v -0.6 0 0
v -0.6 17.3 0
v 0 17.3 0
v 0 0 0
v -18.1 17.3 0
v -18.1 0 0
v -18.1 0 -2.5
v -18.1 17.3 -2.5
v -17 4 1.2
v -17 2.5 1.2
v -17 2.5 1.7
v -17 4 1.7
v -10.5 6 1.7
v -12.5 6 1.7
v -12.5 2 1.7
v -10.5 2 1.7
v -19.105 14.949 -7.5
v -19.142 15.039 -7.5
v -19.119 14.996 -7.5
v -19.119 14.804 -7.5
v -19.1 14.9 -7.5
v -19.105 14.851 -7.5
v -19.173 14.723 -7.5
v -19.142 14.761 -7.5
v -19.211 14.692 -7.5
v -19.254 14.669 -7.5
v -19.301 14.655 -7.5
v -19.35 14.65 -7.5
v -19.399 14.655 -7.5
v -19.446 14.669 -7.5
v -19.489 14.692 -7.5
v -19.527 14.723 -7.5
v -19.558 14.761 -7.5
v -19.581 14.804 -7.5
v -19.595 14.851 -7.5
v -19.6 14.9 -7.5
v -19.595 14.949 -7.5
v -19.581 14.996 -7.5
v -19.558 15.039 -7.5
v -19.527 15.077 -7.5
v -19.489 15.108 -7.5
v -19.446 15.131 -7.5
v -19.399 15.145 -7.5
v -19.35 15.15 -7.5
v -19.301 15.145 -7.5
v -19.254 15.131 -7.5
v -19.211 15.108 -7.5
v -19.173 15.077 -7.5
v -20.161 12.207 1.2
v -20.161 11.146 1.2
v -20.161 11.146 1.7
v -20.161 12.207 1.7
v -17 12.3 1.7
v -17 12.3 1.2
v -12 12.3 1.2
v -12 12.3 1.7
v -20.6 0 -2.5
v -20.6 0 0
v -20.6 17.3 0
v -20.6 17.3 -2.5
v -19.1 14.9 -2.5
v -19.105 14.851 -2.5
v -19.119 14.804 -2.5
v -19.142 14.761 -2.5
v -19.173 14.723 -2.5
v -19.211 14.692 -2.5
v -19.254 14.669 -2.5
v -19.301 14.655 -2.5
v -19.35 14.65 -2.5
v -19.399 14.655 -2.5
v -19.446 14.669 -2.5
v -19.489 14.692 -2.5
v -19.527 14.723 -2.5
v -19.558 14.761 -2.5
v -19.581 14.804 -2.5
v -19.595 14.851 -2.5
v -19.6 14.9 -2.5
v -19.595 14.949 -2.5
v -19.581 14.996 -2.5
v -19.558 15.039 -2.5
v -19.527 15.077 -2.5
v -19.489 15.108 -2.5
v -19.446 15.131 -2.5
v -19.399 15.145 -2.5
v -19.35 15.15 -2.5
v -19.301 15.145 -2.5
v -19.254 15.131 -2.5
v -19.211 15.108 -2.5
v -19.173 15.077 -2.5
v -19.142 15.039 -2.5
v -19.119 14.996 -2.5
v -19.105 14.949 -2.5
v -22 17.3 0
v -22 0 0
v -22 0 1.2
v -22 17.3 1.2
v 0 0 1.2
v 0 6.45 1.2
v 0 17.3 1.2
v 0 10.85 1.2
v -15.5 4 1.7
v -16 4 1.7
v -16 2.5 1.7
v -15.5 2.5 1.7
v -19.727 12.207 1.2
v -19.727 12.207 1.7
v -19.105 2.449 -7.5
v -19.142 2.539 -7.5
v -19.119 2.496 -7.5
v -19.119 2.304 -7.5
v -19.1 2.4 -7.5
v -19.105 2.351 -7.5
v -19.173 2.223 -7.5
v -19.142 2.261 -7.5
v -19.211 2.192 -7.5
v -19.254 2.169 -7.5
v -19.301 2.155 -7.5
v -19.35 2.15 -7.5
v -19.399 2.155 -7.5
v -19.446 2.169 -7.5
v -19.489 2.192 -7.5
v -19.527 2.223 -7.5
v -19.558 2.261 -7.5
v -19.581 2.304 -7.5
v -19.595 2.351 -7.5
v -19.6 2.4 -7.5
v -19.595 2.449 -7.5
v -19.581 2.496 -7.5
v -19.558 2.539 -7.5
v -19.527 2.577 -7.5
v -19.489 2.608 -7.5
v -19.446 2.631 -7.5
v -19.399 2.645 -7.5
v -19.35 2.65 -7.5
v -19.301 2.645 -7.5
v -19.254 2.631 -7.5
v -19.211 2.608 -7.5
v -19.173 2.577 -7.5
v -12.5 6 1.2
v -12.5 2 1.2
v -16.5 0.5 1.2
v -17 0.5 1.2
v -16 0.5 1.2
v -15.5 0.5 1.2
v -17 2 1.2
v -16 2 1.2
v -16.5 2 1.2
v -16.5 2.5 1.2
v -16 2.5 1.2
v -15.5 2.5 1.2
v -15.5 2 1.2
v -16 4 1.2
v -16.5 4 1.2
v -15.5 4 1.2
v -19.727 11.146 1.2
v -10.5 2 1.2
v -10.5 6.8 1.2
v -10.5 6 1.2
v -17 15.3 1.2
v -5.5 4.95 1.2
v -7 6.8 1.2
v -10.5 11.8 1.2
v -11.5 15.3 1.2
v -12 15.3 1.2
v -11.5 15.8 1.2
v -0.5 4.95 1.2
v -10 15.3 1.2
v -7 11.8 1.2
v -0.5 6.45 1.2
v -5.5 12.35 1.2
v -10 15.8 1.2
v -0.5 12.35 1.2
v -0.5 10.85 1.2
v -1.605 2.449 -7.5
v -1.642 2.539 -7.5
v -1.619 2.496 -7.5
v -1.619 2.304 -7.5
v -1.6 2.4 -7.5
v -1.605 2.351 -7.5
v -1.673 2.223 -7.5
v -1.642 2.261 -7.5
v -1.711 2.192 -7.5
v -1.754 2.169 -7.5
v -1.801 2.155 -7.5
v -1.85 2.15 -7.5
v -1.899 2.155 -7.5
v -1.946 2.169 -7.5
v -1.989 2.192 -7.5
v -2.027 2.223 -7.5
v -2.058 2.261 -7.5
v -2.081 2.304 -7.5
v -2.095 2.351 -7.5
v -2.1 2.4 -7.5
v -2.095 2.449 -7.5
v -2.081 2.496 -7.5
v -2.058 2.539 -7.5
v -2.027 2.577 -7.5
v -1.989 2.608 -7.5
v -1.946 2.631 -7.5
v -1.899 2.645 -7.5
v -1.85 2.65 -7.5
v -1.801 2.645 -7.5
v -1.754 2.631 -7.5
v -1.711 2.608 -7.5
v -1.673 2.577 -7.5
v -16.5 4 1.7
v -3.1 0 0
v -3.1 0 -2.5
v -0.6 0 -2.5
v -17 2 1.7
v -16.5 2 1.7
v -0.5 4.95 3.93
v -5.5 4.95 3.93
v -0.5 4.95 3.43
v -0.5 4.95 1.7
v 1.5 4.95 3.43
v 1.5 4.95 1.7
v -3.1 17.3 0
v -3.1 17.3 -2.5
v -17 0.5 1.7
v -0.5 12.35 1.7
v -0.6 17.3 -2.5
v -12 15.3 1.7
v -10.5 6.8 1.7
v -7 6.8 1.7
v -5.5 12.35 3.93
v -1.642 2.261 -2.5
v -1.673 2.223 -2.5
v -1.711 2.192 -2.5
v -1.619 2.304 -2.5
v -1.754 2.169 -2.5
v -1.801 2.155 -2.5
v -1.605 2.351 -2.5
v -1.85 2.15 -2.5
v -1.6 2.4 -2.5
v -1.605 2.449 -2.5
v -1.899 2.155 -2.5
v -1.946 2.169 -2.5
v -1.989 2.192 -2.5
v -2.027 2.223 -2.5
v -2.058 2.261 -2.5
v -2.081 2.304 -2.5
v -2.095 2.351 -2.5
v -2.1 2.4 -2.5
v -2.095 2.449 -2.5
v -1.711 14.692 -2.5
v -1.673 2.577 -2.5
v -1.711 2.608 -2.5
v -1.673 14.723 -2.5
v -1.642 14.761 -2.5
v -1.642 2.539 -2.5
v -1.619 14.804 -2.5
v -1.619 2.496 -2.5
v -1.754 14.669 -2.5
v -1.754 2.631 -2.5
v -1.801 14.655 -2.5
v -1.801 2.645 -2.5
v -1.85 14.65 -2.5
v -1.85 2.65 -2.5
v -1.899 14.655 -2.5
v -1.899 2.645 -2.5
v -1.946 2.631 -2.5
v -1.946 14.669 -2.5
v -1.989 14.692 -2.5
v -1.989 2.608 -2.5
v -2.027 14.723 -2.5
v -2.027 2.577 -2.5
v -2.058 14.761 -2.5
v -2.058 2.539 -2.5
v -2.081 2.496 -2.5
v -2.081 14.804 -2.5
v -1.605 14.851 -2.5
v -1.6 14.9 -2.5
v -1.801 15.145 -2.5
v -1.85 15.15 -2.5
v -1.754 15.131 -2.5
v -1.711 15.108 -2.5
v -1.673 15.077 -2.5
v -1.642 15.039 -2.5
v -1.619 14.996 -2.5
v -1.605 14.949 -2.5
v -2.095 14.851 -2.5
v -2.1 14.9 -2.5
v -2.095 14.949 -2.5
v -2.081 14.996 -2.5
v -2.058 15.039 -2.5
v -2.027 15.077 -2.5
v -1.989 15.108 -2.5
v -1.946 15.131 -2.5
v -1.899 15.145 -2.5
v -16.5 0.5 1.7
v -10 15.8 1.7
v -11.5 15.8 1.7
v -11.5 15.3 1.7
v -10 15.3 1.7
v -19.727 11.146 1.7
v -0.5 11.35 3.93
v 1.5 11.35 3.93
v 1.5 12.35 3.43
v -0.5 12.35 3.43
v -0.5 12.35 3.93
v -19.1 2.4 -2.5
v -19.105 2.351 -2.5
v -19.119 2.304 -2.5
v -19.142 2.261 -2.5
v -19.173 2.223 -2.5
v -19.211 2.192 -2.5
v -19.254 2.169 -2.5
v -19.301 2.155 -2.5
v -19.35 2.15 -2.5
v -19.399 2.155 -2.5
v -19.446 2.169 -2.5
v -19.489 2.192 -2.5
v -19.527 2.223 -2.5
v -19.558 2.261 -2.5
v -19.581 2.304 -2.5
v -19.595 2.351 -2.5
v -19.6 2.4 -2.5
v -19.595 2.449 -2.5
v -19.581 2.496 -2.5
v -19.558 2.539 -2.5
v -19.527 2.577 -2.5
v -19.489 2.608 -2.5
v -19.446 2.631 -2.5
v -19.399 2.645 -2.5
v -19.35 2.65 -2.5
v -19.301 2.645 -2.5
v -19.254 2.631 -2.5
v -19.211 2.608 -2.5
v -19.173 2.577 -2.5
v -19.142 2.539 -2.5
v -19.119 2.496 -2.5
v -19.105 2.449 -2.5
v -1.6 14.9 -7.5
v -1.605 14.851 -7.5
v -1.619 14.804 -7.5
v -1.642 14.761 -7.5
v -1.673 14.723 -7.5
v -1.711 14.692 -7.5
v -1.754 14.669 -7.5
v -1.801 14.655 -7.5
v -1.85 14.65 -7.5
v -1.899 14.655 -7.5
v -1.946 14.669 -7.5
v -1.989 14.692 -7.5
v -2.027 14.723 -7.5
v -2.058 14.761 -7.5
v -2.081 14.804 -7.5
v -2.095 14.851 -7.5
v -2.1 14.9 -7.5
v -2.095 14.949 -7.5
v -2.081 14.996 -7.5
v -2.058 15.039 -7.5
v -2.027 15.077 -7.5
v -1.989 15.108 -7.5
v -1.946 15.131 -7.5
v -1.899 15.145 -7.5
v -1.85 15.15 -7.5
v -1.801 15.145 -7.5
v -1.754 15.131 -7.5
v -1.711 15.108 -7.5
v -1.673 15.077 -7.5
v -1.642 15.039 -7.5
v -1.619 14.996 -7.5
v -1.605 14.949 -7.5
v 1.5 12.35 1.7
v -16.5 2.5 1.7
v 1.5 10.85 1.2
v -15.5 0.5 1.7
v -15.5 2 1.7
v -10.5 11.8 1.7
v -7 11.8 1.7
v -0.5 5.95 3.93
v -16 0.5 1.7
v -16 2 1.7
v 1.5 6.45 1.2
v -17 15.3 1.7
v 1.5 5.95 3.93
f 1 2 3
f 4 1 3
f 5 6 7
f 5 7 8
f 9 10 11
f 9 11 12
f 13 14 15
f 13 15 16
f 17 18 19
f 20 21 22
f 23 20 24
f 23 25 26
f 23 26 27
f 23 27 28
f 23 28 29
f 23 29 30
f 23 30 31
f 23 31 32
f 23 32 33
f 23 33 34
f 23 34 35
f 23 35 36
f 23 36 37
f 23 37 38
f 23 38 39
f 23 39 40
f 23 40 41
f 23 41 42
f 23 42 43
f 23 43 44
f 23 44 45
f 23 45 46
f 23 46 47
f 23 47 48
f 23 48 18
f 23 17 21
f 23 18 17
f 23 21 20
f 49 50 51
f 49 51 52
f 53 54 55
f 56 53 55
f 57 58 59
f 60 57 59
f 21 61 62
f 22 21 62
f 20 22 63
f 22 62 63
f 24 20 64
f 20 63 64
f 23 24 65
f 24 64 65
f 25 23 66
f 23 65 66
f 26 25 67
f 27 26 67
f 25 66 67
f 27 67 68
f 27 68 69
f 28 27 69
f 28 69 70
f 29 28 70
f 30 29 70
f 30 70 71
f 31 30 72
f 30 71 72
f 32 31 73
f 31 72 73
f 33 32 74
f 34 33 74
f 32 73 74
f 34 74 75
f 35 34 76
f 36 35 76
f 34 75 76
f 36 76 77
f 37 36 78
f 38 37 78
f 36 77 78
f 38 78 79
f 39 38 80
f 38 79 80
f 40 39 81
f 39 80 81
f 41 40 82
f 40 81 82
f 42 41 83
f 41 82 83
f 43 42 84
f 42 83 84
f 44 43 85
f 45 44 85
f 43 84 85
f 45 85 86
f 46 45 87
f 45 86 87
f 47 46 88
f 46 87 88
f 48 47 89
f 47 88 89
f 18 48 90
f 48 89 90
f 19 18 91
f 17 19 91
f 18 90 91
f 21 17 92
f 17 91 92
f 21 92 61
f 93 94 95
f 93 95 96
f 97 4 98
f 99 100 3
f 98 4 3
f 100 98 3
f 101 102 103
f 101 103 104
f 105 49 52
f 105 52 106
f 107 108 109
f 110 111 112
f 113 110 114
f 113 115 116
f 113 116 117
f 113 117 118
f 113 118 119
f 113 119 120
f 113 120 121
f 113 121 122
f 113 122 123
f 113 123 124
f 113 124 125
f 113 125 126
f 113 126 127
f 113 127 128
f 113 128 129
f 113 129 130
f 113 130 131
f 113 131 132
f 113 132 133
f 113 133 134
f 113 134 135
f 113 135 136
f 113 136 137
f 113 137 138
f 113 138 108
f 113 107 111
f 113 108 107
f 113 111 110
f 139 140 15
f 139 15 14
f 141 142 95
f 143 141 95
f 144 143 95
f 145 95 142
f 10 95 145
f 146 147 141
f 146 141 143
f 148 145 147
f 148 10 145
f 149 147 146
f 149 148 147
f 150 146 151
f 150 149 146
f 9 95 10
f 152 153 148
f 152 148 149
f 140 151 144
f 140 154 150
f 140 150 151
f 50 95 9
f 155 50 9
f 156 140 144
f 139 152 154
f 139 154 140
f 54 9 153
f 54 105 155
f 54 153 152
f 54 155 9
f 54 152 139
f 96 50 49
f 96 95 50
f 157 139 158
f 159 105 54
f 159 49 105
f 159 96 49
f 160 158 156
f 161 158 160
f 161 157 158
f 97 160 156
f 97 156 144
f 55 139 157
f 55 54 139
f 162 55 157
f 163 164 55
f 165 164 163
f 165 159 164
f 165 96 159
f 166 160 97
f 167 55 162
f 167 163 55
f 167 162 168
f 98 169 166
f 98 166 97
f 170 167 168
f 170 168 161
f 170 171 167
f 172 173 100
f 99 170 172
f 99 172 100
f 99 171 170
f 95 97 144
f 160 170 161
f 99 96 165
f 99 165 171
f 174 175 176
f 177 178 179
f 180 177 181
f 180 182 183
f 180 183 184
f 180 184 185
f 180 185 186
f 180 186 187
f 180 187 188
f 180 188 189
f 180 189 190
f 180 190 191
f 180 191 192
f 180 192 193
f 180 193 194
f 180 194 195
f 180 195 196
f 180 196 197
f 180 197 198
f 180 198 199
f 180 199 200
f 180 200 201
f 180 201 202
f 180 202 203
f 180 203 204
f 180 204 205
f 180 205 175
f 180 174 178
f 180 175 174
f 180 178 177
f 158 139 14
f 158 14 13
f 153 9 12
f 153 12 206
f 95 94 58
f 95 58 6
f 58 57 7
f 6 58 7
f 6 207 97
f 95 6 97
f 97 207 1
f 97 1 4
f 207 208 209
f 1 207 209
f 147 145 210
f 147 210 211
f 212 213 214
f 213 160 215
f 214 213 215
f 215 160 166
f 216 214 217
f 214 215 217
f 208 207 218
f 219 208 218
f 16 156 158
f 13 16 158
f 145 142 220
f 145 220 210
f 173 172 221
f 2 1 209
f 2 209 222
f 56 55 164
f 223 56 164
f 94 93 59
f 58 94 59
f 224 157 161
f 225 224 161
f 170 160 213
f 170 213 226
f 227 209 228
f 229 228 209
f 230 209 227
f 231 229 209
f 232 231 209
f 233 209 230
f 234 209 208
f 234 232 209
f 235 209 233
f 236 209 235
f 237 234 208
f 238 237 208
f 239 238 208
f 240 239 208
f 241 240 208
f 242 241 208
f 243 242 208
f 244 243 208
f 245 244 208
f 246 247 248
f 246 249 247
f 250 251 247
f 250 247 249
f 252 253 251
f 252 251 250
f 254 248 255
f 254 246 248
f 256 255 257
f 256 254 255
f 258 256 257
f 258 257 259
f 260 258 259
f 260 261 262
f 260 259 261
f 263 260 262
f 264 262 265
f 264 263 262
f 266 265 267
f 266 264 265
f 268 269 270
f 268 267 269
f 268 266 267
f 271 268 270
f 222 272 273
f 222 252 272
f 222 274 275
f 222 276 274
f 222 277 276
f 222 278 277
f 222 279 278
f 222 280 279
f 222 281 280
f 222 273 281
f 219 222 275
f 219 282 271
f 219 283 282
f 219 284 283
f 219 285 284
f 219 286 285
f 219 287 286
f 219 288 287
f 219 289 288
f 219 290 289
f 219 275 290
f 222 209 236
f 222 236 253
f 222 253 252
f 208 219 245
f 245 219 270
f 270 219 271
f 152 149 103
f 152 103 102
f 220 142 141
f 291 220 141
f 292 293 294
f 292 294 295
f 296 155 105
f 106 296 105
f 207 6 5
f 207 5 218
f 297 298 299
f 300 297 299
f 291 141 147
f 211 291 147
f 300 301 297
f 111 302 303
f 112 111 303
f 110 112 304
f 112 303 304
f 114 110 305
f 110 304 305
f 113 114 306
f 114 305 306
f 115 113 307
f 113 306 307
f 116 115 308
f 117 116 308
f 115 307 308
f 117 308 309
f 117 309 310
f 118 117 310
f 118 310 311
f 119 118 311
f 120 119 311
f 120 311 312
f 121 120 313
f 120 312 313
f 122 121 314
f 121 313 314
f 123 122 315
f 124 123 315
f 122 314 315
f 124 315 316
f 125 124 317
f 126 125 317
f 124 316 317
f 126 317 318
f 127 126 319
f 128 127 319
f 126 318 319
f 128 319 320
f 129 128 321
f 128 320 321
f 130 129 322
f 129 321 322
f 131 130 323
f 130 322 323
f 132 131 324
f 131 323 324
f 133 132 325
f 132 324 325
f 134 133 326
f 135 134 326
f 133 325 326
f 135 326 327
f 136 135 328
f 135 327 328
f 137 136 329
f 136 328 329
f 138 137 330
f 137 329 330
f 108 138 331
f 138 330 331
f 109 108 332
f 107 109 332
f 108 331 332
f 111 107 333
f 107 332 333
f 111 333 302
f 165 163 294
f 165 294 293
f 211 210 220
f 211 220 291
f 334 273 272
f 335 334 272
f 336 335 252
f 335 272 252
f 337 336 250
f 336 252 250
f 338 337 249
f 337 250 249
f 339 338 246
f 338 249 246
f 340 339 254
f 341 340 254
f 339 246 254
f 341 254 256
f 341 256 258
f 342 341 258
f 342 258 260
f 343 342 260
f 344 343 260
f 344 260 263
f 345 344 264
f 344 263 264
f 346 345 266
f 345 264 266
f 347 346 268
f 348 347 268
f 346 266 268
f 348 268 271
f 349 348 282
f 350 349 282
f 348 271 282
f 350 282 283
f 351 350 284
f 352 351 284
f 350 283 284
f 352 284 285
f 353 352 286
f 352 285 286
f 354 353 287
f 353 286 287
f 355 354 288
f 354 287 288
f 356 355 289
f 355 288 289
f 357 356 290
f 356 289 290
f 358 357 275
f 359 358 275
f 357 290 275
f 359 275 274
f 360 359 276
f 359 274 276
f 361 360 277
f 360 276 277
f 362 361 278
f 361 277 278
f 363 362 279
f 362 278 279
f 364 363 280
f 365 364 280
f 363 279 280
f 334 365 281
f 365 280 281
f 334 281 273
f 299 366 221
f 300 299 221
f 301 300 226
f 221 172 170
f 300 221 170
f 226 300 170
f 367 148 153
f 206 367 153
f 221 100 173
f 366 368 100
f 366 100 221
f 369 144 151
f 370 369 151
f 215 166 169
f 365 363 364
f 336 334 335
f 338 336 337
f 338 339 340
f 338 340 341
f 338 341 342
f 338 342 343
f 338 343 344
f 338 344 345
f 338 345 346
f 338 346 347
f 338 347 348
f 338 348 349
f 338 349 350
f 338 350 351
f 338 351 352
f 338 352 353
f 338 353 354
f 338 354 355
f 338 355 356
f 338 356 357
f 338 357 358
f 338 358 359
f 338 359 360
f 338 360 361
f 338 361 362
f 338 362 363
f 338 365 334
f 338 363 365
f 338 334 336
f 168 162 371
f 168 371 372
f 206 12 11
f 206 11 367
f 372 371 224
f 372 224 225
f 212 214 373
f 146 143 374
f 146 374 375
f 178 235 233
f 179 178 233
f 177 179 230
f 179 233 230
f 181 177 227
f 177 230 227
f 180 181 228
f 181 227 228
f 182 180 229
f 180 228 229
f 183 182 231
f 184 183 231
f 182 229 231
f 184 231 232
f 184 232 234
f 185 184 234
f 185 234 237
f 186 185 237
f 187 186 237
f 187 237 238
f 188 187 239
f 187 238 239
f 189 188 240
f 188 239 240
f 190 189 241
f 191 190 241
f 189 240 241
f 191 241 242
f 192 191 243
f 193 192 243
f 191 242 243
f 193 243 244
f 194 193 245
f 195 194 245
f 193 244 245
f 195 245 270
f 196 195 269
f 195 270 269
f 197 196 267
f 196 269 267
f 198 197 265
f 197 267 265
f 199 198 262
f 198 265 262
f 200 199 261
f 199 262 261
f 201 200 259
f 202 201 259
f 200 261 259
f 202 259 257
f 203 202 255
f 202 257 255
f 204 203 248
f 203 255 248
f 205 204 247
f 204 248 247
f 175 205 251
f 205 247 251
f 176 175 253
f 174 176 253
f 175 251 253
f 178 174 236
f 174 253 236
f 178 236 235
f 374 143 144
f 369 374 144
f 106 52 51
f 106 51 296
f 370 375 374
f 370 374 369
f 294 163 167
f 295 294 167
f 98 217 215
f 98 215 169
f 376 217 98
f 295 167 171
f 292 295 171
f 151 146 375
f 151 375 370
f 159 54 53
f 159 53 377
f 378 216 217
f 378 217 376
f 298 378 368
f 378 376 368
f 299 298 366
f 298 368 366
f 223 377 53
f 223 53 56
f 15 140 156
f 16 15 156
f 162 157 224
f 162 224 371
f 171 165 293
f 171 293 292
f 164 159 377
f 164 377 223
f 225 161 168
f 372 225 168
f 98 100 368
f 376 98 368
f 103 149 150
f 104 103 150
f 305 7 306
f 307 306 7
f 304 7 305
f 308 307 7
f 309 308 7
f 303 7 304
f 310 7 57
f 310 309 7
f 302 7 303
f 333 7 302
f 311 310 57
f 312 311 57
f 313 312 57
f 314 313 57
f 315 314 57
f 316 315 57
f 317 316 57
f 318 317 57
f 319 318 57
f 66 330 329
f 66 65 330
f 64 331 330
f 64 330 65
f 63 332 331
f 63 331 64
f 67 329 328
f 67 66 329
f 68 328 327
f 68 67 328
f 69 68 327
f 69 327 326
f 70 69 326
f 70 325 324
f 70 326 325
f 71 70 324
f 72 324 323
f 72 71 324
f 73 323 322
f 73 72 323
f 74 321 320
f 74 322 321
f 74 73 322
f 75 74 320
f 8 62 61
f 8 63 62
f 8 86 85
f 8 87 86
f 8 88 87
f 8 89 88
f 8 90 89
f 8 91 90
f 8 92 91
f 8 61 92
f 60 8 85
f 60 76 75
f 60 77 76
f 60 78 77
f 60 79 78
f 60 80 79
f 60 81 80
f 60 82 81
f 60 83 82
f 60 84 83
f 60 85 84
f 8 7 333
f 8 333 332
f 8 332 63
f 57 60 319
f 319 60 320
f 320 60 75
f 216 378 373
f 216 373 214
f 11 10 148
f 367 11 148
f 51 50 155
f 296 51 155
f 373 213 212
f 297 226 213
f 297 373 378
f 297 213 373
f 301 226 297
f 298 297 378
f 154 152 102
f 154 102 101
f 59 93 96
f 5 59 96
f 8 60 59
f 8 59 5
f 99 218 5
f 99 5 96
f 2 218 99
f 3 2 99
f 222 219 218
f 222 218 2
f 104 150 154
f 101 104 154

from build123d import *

# Parameters (mm, degrees)
ESQUISSE1_W             = 22
ESQUISSE1_H             = 17.3
BOSS_EXTRU_1_DEPTH      = 1.2
ESQUISSE2_W             = 5.5
ESQUISSE2_H             = 7.4
ESQUISSE2_W_2           = 1.5
BOSS_EXTRU_2_DEPTH      = 2.73
ESQUISSE5_W             = 2
ESQUISSE5_H             = 4
ESQUISSE5_W_2           = 0.5
ESQUISSE5_H_2           = 1.5
ESQUISSE5_W_3           = 5
ESQUISSE5_H_3           = 3
ESQUISSE5_W_4           = 1.5
ESQUISSE5_H_4           = 0.5
ESQUISSE5_W_5           = 0.43407564
ESQUISSE5_H_5           = 1.061073785
ESQUISSE5_W_6           = 3.5
ESQUISSE5_H_6           = 5
BOSS_EXTRU_5_DEPTH      = 0.5
ENL_V_MAT_EXTRU_4_DEPTH = 2
ESQUISSE11_W            = 2.5
ESQUISSE11_H            = 17.3
BOSS_EXTRU_8_DEPTH      = 2.5
ESQUISSE12_R            = 0.25
BOSS_EXTRU_9_DEPTH      = 5


with BuildPart() as part:
    # Esquisse1 → Boss.-Extru.1 (new body)
    with BuildSketch(Plane.XY):
        with Locations((-11, 8.65)):
            Rectangle(ESQUISSE1_W, ESQUISSE1_H)
    extrude(amount=BOSS_EXTRU_1_DEPTH)

    # Esquisse2 → Boss.-Extru.2 (add)
    with BuildSketch(Plane.XY.offset(1.2)):
        with Locations((-2.75, 8.65)):
            Rectangle(ESQUISSE2_W, ESQUISSE2_H)
        with Locations((0.75, 8.65)):
            Rectangle(ESQUISSE2_W_2, ESQUISSE2_H)
    extrude(amount=BOSS_EXTRU_2_DEPTH)

    # Esquisse5 → Boss.-Extru.5 (add)
    with BuildSketch(Plane.XY.offset(1.2)):
        with Locations((-11.5, 4)):
            Rectangle(ESQUISSE5_W, ESQUISSE5_H)
        with Locations((-15.75, 1.25)):
            Rectangle(ESQUISSE5_W_2, ESQUISSE5_H_2)
        with Locations((-16.75, 1.25)):
            Rectangle(ESQUISSE5_W_2, ESQUISSE5_H_2)
        with Locations((-15.75, 3.25)):
            Rectangle(ESQUISSE5_W_2, ESQUISSE5_H_2)
        with Locations((-16.75, 3.25)):
            Rectangle(ESQUISSE5_W_2, ESQUISSE5_H_2)
        with Locations((-14.5, 13.8)):
            Rectangle(ESQUISSE5_W_3, ESQUISSE5_H_3)
        with Locations((-10.75, 15.55)):
            Rectangle(ESQUISSE5_W_4, ESQUISSE5_H_4)
        with Locations((-19.944355947, 11.67647182)):
            Rectangle(ESQUISSE5_W_5, ESQUISSE5_H_5)
        with Locations((-8.75, 9.3)):
            Rectangle(ESQUISSE5_W_6, ESQUISSE5_H_6)
    extrude(amount=BOSS_EXTRU_5_DEPTH)

    # Esquisse8 → Enlèv. mat.-Extru.4 (cut)
    with BuildSketch(Plane(origin=(1.5, 0, 0), x_dir=(0, 0, -1), z_dir=(1, 0, 0))):
        Polygon((-1.2, 6.45), (-1.2, 4.95), (-1.7, 4.95), align=None)
        Polygon((-1.2, 10.85), (-1.7, 12.35), (-1.2, 12.35), align=None)
        Polygon((-3.93, 4.95), (-3.93, 5.95), (-3.43, 4.95), align=None)
        Polygon((-3.93, 11.35), (-3.43, 12.35), (-3.93, 12.35), align=None)
    extrude(amount=-ENL_V_MAT_EXTRU_4_DEPTH, mode=Mode.SUBTRACT)

    # Esquisse11 → Boss.-Extru.8 (add)
    with BuildSketch(Plane(origin=(0, 0, 0), x_dir=(-1, 0, 0), z_dir=(0, 0, -1))):
        with Locations((1.85, 8.65)):
            Rectangle(ESQUISSE11_W, ESQUISSE11_H)
        with Locations((19.35, 8.65)):
            Rectangle(ESQUISSE11_W, ESQUISSE11_H)
    extrude(amount=BOSS_EXTRU_8_DEPTH)

    # Esquisse12 → Boss.-Extru.9 (add)
    with BuildSketch(Plane(origin=(0, 0, -2.5), x_dir=(-1, 0, 0), z_dir=(0, 0, -1))):
        with Locations(Location((1.85, 2.4, 0), (0, 0, 180))):
            Circle(ESQUISSE12_R)
        with Locations(Location((1.85, 14.9, 0), (0, 0, 180))):
            Circle(ESQUISSE12_R)
        with Locations(Location((19.35, 14.9, 0), (0, 0, 180))):
            Circle(ESQUISSE12_R)
        with Locations(Location((19.35, 2.4, 0), (0, 0, 180))):
            Circle(ESQUISSE12_R)
    extrude(amount=BOSS_EXTRU_9_DEPTH)


solid = part.part
